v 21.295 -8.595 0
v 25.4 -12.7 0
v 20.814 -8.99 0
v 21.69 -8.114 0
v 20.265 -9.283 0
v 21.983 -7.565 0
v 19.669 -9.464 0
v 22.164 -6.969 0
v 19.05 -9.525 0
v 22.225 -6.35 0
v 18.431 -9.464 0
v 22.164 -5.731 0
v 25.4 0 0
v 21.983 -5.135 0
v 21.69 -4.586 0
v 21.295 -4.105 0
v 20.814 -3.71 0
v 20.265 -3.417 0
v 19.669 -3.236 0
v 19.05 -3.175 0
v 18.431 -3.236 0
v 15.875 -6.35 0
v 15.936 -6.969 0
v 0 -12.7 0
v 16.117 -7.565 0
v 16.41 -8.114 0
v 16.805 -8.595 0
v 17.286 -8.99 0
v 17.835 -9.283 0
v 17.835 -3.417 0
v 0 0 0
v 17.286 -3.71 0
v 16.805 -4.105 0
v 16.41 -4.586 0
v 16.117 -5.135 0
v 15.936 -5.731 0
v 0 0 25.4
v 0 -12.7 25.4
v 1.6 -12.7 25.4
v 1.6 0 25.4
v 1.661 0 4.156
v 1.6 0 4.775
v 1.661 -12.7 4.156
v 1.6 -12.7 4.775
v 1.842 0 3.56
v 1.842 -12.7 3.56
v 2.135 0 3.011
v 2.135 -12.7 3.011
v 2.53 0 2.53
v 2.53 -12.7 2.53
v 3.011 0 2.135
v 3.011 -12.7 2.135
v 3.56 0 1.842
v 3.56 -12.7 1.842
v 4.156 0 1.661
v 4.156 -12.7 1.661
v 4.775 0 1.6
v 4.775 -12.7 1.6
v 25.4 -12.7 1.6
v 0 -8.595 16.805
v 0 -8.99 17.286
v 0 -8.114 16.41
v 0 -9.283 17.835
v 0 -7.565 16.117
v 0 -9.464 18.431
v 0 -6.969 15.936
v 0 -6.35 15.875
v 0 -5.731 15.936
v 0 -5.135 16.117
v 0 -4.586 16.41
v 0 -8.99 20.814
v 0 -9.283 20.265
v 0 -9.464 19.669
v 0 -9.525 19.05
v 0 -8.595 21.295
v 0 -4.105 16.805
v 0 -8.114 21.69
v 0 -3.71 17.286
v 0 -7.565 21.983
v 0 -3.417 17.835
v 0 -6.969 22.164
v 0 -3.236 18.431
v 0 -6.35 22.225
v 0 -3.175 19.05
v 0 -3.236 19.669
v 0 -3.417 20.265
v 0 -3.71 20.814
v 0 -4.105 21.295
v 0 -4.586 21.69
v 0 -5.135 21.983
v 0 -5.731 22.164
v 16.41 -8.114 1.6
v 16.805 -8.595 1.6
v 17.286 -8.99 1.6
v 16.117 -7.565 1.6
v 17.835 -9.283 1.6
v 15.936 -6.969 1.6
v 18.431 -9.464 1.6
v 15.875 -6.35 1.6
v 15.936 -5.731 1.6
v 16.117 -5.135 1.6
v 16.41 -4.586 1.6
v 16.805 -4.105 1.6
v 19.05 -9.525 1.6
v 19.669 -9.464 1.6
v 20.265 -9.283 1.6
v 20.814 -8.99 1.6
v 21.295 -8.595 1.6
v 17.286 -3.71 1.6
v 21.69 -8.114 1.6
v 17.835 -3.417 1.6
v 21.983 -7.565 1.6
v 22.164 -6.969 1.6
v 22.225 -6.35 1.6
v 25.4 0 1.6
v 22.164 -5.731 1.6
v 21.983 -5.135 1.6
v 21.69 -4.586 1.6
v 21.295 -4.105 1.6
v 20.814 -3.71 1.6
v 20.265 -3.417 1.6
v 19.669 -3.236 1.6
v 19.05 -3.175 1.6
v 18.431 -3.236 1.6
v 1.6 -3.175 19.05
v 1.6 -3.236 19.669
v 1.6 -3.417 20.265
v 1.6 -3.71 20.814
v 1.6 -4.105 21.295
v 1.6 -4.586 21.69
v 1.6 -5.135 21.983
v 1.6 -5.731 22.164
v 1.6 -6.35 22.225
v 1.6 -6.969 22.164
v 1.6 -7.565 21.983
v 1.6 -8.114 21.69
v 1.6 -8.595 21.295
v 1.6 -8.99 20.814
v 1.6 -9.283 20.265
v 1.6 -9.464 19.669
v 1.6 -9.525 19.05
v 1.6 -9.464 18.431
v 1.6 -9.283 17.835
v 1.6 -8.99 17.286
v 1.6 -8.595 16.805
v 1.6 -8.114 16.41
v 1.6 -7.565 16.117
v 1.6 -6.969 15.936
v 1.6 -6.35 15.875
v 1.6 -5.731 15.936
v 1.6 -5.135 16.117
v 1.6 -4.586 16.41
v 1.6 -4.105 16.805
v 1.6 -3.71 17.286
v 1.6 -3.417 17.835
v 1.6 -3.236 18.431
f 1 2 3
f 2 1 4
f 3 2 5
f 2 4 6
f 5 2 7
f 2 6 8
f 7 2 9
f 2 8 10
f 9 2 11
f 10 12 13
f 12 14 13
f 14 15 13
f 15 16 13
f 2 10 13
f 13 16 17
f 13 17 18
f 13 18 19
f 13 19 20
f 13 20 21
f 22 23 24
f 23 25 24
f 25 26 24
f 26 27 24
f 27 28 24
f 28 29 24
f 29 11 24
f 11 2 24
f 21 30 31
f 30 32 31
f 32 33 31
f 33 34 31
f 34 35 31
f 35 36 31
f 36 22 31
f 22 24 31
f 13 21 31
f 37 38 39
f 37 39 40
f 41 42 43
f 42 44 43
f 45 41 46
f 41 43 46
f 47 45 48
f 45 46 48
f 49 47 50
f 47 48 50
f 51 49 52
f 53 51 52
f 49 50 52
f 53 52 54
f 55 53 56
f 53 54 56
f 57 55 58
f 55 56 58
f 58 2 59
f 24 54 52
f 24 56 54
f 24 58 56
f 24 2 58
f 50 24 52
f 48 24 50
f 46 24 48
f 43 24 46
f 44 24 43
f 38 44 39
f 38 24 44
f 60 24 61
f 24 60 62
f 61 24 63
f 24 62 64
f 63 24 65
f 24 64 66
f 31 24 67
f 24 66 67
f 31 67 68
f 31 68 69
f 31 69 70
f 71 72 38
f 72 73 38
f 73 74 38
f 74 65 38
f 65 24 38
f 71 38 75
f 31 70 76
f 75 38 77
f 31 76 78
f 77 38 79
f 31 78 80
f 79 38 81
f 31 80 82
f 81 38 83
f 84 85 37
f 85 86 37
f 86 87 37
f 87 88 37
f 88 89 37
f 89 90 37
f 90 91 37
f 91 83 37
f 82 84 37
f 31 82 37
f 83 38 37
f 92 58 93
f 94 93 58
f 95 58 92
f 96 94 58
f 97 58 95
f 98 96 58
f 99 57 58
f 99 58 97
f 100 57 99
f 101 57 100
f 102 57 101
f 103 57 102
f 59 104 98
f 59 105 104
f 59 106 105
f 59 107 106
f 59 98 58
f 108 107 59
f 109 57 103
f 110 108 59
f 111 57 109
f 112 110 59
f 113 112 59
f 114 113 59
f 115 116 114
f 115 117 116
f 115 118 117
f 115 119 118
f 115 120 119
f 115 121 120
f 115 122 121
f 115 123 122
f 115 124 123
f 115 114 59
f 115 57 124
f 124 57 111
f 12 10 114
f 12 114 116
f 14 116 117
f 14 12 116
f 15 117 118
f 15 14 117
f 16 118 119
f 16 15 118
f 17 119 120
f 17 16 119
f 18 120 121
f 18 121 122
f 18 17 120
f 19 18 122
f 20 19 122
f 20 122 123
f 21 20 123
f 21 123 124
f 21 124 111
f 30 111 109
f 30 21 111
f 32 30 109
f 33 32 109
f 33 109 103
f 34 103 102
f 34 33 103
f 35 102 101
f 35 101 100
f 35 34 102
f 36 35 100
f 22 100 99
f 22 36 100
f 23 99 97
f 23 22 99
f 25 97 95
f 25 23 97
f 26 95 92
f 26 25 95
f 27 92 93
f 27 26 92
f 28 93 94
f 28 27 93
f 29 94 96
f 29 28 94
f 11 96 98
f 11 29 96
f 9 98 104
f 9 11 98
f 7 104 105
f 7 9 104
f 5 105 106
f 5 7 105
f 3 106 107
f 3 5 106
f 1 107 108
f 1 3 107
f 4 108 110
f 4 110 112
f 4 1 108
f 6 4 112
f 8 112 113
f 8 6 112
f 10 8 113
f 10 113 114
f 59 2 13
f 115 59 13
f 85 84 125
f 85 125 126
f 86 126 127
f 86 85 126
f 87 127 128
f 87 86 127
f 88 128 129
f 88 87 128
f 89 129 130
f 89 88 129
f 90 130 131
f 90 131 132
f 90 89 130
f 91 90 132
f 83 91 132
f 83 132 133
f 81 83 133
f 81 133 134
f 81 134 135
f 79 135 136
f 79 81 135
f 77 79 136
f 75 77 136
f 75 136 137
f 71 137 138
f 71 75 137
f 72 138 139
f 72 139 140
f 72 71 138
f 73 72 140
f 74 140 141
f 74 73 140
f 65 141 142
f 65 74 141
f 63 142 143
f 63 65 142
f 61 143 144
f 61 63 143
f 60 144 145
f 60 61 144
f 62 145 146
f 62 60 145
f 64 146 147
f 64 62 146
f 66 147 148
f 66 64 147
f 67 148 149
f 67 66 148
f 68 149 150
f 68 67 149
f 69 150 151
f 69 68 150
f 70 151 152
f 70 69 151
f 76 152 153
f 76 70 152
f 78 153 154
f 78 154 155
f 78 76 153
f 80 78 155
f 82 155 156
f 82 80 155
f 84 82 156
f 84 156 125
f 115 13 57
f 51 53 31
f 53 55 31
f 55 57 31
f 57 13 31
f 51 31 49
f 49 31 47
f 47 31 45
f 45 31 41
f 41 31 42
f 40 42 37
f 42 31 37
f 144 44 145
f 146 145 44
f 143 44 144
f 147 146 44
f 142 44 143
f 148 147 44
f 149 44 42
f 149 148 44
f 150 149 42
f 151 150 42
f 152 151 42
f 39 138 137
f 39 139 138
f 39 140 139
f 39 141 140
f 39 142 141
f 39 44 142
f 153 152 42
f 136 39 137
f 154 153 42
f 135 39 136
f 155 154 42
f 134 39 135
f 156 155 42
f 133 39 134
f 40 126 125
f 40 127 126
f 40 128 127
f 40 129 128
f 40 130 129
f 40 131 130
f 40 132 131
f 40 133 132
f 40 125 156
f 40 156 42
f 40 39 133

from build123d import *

# Parameters (mm, degrees)
F0_W     = 12.7
F0_H     = 25.4
F0_R     = 3.175
F1_DEPTH = 1.6002
F2_W     = 25.4
F2_H     = 12.7
F2_R     = 3.175
F3_DEPTH = 1.6002
F4_R     = 3.175


with BuildPart() as f1:
    # F0 (on Right) → F1 (new body)
    with BuildSketch(Plane.YZ):
        with Locations((-6.35, 12.7)):
            Rectangle(F0_W, F0_H)
        with Locations((-6.35, 19.05)):
            Circle(F0_R, mode=Mode.SUBTRACT)
    extrude(amount=F1_DEPTH)

    # F2 (on Top) → F3 (join)
    with BuildSketch(Plane.XY):
        with Locations((12.7, -6.35)):
            Rectangle(F2_W, F2_H)
        with Locations((19.05, -6.35)):
            Circle(F2_R, mode=Mode.SUBTRACT)
    extrude(amount=F3_DEPTH)

    # F4
    f4_edges = [f1.edges().sort_by_distance(p)[0] for p in [
        (1.6002, -6.35, 1.6002),
    ]]
    fillet(f4_edges, radius=F4_R)


solid = f1.part
